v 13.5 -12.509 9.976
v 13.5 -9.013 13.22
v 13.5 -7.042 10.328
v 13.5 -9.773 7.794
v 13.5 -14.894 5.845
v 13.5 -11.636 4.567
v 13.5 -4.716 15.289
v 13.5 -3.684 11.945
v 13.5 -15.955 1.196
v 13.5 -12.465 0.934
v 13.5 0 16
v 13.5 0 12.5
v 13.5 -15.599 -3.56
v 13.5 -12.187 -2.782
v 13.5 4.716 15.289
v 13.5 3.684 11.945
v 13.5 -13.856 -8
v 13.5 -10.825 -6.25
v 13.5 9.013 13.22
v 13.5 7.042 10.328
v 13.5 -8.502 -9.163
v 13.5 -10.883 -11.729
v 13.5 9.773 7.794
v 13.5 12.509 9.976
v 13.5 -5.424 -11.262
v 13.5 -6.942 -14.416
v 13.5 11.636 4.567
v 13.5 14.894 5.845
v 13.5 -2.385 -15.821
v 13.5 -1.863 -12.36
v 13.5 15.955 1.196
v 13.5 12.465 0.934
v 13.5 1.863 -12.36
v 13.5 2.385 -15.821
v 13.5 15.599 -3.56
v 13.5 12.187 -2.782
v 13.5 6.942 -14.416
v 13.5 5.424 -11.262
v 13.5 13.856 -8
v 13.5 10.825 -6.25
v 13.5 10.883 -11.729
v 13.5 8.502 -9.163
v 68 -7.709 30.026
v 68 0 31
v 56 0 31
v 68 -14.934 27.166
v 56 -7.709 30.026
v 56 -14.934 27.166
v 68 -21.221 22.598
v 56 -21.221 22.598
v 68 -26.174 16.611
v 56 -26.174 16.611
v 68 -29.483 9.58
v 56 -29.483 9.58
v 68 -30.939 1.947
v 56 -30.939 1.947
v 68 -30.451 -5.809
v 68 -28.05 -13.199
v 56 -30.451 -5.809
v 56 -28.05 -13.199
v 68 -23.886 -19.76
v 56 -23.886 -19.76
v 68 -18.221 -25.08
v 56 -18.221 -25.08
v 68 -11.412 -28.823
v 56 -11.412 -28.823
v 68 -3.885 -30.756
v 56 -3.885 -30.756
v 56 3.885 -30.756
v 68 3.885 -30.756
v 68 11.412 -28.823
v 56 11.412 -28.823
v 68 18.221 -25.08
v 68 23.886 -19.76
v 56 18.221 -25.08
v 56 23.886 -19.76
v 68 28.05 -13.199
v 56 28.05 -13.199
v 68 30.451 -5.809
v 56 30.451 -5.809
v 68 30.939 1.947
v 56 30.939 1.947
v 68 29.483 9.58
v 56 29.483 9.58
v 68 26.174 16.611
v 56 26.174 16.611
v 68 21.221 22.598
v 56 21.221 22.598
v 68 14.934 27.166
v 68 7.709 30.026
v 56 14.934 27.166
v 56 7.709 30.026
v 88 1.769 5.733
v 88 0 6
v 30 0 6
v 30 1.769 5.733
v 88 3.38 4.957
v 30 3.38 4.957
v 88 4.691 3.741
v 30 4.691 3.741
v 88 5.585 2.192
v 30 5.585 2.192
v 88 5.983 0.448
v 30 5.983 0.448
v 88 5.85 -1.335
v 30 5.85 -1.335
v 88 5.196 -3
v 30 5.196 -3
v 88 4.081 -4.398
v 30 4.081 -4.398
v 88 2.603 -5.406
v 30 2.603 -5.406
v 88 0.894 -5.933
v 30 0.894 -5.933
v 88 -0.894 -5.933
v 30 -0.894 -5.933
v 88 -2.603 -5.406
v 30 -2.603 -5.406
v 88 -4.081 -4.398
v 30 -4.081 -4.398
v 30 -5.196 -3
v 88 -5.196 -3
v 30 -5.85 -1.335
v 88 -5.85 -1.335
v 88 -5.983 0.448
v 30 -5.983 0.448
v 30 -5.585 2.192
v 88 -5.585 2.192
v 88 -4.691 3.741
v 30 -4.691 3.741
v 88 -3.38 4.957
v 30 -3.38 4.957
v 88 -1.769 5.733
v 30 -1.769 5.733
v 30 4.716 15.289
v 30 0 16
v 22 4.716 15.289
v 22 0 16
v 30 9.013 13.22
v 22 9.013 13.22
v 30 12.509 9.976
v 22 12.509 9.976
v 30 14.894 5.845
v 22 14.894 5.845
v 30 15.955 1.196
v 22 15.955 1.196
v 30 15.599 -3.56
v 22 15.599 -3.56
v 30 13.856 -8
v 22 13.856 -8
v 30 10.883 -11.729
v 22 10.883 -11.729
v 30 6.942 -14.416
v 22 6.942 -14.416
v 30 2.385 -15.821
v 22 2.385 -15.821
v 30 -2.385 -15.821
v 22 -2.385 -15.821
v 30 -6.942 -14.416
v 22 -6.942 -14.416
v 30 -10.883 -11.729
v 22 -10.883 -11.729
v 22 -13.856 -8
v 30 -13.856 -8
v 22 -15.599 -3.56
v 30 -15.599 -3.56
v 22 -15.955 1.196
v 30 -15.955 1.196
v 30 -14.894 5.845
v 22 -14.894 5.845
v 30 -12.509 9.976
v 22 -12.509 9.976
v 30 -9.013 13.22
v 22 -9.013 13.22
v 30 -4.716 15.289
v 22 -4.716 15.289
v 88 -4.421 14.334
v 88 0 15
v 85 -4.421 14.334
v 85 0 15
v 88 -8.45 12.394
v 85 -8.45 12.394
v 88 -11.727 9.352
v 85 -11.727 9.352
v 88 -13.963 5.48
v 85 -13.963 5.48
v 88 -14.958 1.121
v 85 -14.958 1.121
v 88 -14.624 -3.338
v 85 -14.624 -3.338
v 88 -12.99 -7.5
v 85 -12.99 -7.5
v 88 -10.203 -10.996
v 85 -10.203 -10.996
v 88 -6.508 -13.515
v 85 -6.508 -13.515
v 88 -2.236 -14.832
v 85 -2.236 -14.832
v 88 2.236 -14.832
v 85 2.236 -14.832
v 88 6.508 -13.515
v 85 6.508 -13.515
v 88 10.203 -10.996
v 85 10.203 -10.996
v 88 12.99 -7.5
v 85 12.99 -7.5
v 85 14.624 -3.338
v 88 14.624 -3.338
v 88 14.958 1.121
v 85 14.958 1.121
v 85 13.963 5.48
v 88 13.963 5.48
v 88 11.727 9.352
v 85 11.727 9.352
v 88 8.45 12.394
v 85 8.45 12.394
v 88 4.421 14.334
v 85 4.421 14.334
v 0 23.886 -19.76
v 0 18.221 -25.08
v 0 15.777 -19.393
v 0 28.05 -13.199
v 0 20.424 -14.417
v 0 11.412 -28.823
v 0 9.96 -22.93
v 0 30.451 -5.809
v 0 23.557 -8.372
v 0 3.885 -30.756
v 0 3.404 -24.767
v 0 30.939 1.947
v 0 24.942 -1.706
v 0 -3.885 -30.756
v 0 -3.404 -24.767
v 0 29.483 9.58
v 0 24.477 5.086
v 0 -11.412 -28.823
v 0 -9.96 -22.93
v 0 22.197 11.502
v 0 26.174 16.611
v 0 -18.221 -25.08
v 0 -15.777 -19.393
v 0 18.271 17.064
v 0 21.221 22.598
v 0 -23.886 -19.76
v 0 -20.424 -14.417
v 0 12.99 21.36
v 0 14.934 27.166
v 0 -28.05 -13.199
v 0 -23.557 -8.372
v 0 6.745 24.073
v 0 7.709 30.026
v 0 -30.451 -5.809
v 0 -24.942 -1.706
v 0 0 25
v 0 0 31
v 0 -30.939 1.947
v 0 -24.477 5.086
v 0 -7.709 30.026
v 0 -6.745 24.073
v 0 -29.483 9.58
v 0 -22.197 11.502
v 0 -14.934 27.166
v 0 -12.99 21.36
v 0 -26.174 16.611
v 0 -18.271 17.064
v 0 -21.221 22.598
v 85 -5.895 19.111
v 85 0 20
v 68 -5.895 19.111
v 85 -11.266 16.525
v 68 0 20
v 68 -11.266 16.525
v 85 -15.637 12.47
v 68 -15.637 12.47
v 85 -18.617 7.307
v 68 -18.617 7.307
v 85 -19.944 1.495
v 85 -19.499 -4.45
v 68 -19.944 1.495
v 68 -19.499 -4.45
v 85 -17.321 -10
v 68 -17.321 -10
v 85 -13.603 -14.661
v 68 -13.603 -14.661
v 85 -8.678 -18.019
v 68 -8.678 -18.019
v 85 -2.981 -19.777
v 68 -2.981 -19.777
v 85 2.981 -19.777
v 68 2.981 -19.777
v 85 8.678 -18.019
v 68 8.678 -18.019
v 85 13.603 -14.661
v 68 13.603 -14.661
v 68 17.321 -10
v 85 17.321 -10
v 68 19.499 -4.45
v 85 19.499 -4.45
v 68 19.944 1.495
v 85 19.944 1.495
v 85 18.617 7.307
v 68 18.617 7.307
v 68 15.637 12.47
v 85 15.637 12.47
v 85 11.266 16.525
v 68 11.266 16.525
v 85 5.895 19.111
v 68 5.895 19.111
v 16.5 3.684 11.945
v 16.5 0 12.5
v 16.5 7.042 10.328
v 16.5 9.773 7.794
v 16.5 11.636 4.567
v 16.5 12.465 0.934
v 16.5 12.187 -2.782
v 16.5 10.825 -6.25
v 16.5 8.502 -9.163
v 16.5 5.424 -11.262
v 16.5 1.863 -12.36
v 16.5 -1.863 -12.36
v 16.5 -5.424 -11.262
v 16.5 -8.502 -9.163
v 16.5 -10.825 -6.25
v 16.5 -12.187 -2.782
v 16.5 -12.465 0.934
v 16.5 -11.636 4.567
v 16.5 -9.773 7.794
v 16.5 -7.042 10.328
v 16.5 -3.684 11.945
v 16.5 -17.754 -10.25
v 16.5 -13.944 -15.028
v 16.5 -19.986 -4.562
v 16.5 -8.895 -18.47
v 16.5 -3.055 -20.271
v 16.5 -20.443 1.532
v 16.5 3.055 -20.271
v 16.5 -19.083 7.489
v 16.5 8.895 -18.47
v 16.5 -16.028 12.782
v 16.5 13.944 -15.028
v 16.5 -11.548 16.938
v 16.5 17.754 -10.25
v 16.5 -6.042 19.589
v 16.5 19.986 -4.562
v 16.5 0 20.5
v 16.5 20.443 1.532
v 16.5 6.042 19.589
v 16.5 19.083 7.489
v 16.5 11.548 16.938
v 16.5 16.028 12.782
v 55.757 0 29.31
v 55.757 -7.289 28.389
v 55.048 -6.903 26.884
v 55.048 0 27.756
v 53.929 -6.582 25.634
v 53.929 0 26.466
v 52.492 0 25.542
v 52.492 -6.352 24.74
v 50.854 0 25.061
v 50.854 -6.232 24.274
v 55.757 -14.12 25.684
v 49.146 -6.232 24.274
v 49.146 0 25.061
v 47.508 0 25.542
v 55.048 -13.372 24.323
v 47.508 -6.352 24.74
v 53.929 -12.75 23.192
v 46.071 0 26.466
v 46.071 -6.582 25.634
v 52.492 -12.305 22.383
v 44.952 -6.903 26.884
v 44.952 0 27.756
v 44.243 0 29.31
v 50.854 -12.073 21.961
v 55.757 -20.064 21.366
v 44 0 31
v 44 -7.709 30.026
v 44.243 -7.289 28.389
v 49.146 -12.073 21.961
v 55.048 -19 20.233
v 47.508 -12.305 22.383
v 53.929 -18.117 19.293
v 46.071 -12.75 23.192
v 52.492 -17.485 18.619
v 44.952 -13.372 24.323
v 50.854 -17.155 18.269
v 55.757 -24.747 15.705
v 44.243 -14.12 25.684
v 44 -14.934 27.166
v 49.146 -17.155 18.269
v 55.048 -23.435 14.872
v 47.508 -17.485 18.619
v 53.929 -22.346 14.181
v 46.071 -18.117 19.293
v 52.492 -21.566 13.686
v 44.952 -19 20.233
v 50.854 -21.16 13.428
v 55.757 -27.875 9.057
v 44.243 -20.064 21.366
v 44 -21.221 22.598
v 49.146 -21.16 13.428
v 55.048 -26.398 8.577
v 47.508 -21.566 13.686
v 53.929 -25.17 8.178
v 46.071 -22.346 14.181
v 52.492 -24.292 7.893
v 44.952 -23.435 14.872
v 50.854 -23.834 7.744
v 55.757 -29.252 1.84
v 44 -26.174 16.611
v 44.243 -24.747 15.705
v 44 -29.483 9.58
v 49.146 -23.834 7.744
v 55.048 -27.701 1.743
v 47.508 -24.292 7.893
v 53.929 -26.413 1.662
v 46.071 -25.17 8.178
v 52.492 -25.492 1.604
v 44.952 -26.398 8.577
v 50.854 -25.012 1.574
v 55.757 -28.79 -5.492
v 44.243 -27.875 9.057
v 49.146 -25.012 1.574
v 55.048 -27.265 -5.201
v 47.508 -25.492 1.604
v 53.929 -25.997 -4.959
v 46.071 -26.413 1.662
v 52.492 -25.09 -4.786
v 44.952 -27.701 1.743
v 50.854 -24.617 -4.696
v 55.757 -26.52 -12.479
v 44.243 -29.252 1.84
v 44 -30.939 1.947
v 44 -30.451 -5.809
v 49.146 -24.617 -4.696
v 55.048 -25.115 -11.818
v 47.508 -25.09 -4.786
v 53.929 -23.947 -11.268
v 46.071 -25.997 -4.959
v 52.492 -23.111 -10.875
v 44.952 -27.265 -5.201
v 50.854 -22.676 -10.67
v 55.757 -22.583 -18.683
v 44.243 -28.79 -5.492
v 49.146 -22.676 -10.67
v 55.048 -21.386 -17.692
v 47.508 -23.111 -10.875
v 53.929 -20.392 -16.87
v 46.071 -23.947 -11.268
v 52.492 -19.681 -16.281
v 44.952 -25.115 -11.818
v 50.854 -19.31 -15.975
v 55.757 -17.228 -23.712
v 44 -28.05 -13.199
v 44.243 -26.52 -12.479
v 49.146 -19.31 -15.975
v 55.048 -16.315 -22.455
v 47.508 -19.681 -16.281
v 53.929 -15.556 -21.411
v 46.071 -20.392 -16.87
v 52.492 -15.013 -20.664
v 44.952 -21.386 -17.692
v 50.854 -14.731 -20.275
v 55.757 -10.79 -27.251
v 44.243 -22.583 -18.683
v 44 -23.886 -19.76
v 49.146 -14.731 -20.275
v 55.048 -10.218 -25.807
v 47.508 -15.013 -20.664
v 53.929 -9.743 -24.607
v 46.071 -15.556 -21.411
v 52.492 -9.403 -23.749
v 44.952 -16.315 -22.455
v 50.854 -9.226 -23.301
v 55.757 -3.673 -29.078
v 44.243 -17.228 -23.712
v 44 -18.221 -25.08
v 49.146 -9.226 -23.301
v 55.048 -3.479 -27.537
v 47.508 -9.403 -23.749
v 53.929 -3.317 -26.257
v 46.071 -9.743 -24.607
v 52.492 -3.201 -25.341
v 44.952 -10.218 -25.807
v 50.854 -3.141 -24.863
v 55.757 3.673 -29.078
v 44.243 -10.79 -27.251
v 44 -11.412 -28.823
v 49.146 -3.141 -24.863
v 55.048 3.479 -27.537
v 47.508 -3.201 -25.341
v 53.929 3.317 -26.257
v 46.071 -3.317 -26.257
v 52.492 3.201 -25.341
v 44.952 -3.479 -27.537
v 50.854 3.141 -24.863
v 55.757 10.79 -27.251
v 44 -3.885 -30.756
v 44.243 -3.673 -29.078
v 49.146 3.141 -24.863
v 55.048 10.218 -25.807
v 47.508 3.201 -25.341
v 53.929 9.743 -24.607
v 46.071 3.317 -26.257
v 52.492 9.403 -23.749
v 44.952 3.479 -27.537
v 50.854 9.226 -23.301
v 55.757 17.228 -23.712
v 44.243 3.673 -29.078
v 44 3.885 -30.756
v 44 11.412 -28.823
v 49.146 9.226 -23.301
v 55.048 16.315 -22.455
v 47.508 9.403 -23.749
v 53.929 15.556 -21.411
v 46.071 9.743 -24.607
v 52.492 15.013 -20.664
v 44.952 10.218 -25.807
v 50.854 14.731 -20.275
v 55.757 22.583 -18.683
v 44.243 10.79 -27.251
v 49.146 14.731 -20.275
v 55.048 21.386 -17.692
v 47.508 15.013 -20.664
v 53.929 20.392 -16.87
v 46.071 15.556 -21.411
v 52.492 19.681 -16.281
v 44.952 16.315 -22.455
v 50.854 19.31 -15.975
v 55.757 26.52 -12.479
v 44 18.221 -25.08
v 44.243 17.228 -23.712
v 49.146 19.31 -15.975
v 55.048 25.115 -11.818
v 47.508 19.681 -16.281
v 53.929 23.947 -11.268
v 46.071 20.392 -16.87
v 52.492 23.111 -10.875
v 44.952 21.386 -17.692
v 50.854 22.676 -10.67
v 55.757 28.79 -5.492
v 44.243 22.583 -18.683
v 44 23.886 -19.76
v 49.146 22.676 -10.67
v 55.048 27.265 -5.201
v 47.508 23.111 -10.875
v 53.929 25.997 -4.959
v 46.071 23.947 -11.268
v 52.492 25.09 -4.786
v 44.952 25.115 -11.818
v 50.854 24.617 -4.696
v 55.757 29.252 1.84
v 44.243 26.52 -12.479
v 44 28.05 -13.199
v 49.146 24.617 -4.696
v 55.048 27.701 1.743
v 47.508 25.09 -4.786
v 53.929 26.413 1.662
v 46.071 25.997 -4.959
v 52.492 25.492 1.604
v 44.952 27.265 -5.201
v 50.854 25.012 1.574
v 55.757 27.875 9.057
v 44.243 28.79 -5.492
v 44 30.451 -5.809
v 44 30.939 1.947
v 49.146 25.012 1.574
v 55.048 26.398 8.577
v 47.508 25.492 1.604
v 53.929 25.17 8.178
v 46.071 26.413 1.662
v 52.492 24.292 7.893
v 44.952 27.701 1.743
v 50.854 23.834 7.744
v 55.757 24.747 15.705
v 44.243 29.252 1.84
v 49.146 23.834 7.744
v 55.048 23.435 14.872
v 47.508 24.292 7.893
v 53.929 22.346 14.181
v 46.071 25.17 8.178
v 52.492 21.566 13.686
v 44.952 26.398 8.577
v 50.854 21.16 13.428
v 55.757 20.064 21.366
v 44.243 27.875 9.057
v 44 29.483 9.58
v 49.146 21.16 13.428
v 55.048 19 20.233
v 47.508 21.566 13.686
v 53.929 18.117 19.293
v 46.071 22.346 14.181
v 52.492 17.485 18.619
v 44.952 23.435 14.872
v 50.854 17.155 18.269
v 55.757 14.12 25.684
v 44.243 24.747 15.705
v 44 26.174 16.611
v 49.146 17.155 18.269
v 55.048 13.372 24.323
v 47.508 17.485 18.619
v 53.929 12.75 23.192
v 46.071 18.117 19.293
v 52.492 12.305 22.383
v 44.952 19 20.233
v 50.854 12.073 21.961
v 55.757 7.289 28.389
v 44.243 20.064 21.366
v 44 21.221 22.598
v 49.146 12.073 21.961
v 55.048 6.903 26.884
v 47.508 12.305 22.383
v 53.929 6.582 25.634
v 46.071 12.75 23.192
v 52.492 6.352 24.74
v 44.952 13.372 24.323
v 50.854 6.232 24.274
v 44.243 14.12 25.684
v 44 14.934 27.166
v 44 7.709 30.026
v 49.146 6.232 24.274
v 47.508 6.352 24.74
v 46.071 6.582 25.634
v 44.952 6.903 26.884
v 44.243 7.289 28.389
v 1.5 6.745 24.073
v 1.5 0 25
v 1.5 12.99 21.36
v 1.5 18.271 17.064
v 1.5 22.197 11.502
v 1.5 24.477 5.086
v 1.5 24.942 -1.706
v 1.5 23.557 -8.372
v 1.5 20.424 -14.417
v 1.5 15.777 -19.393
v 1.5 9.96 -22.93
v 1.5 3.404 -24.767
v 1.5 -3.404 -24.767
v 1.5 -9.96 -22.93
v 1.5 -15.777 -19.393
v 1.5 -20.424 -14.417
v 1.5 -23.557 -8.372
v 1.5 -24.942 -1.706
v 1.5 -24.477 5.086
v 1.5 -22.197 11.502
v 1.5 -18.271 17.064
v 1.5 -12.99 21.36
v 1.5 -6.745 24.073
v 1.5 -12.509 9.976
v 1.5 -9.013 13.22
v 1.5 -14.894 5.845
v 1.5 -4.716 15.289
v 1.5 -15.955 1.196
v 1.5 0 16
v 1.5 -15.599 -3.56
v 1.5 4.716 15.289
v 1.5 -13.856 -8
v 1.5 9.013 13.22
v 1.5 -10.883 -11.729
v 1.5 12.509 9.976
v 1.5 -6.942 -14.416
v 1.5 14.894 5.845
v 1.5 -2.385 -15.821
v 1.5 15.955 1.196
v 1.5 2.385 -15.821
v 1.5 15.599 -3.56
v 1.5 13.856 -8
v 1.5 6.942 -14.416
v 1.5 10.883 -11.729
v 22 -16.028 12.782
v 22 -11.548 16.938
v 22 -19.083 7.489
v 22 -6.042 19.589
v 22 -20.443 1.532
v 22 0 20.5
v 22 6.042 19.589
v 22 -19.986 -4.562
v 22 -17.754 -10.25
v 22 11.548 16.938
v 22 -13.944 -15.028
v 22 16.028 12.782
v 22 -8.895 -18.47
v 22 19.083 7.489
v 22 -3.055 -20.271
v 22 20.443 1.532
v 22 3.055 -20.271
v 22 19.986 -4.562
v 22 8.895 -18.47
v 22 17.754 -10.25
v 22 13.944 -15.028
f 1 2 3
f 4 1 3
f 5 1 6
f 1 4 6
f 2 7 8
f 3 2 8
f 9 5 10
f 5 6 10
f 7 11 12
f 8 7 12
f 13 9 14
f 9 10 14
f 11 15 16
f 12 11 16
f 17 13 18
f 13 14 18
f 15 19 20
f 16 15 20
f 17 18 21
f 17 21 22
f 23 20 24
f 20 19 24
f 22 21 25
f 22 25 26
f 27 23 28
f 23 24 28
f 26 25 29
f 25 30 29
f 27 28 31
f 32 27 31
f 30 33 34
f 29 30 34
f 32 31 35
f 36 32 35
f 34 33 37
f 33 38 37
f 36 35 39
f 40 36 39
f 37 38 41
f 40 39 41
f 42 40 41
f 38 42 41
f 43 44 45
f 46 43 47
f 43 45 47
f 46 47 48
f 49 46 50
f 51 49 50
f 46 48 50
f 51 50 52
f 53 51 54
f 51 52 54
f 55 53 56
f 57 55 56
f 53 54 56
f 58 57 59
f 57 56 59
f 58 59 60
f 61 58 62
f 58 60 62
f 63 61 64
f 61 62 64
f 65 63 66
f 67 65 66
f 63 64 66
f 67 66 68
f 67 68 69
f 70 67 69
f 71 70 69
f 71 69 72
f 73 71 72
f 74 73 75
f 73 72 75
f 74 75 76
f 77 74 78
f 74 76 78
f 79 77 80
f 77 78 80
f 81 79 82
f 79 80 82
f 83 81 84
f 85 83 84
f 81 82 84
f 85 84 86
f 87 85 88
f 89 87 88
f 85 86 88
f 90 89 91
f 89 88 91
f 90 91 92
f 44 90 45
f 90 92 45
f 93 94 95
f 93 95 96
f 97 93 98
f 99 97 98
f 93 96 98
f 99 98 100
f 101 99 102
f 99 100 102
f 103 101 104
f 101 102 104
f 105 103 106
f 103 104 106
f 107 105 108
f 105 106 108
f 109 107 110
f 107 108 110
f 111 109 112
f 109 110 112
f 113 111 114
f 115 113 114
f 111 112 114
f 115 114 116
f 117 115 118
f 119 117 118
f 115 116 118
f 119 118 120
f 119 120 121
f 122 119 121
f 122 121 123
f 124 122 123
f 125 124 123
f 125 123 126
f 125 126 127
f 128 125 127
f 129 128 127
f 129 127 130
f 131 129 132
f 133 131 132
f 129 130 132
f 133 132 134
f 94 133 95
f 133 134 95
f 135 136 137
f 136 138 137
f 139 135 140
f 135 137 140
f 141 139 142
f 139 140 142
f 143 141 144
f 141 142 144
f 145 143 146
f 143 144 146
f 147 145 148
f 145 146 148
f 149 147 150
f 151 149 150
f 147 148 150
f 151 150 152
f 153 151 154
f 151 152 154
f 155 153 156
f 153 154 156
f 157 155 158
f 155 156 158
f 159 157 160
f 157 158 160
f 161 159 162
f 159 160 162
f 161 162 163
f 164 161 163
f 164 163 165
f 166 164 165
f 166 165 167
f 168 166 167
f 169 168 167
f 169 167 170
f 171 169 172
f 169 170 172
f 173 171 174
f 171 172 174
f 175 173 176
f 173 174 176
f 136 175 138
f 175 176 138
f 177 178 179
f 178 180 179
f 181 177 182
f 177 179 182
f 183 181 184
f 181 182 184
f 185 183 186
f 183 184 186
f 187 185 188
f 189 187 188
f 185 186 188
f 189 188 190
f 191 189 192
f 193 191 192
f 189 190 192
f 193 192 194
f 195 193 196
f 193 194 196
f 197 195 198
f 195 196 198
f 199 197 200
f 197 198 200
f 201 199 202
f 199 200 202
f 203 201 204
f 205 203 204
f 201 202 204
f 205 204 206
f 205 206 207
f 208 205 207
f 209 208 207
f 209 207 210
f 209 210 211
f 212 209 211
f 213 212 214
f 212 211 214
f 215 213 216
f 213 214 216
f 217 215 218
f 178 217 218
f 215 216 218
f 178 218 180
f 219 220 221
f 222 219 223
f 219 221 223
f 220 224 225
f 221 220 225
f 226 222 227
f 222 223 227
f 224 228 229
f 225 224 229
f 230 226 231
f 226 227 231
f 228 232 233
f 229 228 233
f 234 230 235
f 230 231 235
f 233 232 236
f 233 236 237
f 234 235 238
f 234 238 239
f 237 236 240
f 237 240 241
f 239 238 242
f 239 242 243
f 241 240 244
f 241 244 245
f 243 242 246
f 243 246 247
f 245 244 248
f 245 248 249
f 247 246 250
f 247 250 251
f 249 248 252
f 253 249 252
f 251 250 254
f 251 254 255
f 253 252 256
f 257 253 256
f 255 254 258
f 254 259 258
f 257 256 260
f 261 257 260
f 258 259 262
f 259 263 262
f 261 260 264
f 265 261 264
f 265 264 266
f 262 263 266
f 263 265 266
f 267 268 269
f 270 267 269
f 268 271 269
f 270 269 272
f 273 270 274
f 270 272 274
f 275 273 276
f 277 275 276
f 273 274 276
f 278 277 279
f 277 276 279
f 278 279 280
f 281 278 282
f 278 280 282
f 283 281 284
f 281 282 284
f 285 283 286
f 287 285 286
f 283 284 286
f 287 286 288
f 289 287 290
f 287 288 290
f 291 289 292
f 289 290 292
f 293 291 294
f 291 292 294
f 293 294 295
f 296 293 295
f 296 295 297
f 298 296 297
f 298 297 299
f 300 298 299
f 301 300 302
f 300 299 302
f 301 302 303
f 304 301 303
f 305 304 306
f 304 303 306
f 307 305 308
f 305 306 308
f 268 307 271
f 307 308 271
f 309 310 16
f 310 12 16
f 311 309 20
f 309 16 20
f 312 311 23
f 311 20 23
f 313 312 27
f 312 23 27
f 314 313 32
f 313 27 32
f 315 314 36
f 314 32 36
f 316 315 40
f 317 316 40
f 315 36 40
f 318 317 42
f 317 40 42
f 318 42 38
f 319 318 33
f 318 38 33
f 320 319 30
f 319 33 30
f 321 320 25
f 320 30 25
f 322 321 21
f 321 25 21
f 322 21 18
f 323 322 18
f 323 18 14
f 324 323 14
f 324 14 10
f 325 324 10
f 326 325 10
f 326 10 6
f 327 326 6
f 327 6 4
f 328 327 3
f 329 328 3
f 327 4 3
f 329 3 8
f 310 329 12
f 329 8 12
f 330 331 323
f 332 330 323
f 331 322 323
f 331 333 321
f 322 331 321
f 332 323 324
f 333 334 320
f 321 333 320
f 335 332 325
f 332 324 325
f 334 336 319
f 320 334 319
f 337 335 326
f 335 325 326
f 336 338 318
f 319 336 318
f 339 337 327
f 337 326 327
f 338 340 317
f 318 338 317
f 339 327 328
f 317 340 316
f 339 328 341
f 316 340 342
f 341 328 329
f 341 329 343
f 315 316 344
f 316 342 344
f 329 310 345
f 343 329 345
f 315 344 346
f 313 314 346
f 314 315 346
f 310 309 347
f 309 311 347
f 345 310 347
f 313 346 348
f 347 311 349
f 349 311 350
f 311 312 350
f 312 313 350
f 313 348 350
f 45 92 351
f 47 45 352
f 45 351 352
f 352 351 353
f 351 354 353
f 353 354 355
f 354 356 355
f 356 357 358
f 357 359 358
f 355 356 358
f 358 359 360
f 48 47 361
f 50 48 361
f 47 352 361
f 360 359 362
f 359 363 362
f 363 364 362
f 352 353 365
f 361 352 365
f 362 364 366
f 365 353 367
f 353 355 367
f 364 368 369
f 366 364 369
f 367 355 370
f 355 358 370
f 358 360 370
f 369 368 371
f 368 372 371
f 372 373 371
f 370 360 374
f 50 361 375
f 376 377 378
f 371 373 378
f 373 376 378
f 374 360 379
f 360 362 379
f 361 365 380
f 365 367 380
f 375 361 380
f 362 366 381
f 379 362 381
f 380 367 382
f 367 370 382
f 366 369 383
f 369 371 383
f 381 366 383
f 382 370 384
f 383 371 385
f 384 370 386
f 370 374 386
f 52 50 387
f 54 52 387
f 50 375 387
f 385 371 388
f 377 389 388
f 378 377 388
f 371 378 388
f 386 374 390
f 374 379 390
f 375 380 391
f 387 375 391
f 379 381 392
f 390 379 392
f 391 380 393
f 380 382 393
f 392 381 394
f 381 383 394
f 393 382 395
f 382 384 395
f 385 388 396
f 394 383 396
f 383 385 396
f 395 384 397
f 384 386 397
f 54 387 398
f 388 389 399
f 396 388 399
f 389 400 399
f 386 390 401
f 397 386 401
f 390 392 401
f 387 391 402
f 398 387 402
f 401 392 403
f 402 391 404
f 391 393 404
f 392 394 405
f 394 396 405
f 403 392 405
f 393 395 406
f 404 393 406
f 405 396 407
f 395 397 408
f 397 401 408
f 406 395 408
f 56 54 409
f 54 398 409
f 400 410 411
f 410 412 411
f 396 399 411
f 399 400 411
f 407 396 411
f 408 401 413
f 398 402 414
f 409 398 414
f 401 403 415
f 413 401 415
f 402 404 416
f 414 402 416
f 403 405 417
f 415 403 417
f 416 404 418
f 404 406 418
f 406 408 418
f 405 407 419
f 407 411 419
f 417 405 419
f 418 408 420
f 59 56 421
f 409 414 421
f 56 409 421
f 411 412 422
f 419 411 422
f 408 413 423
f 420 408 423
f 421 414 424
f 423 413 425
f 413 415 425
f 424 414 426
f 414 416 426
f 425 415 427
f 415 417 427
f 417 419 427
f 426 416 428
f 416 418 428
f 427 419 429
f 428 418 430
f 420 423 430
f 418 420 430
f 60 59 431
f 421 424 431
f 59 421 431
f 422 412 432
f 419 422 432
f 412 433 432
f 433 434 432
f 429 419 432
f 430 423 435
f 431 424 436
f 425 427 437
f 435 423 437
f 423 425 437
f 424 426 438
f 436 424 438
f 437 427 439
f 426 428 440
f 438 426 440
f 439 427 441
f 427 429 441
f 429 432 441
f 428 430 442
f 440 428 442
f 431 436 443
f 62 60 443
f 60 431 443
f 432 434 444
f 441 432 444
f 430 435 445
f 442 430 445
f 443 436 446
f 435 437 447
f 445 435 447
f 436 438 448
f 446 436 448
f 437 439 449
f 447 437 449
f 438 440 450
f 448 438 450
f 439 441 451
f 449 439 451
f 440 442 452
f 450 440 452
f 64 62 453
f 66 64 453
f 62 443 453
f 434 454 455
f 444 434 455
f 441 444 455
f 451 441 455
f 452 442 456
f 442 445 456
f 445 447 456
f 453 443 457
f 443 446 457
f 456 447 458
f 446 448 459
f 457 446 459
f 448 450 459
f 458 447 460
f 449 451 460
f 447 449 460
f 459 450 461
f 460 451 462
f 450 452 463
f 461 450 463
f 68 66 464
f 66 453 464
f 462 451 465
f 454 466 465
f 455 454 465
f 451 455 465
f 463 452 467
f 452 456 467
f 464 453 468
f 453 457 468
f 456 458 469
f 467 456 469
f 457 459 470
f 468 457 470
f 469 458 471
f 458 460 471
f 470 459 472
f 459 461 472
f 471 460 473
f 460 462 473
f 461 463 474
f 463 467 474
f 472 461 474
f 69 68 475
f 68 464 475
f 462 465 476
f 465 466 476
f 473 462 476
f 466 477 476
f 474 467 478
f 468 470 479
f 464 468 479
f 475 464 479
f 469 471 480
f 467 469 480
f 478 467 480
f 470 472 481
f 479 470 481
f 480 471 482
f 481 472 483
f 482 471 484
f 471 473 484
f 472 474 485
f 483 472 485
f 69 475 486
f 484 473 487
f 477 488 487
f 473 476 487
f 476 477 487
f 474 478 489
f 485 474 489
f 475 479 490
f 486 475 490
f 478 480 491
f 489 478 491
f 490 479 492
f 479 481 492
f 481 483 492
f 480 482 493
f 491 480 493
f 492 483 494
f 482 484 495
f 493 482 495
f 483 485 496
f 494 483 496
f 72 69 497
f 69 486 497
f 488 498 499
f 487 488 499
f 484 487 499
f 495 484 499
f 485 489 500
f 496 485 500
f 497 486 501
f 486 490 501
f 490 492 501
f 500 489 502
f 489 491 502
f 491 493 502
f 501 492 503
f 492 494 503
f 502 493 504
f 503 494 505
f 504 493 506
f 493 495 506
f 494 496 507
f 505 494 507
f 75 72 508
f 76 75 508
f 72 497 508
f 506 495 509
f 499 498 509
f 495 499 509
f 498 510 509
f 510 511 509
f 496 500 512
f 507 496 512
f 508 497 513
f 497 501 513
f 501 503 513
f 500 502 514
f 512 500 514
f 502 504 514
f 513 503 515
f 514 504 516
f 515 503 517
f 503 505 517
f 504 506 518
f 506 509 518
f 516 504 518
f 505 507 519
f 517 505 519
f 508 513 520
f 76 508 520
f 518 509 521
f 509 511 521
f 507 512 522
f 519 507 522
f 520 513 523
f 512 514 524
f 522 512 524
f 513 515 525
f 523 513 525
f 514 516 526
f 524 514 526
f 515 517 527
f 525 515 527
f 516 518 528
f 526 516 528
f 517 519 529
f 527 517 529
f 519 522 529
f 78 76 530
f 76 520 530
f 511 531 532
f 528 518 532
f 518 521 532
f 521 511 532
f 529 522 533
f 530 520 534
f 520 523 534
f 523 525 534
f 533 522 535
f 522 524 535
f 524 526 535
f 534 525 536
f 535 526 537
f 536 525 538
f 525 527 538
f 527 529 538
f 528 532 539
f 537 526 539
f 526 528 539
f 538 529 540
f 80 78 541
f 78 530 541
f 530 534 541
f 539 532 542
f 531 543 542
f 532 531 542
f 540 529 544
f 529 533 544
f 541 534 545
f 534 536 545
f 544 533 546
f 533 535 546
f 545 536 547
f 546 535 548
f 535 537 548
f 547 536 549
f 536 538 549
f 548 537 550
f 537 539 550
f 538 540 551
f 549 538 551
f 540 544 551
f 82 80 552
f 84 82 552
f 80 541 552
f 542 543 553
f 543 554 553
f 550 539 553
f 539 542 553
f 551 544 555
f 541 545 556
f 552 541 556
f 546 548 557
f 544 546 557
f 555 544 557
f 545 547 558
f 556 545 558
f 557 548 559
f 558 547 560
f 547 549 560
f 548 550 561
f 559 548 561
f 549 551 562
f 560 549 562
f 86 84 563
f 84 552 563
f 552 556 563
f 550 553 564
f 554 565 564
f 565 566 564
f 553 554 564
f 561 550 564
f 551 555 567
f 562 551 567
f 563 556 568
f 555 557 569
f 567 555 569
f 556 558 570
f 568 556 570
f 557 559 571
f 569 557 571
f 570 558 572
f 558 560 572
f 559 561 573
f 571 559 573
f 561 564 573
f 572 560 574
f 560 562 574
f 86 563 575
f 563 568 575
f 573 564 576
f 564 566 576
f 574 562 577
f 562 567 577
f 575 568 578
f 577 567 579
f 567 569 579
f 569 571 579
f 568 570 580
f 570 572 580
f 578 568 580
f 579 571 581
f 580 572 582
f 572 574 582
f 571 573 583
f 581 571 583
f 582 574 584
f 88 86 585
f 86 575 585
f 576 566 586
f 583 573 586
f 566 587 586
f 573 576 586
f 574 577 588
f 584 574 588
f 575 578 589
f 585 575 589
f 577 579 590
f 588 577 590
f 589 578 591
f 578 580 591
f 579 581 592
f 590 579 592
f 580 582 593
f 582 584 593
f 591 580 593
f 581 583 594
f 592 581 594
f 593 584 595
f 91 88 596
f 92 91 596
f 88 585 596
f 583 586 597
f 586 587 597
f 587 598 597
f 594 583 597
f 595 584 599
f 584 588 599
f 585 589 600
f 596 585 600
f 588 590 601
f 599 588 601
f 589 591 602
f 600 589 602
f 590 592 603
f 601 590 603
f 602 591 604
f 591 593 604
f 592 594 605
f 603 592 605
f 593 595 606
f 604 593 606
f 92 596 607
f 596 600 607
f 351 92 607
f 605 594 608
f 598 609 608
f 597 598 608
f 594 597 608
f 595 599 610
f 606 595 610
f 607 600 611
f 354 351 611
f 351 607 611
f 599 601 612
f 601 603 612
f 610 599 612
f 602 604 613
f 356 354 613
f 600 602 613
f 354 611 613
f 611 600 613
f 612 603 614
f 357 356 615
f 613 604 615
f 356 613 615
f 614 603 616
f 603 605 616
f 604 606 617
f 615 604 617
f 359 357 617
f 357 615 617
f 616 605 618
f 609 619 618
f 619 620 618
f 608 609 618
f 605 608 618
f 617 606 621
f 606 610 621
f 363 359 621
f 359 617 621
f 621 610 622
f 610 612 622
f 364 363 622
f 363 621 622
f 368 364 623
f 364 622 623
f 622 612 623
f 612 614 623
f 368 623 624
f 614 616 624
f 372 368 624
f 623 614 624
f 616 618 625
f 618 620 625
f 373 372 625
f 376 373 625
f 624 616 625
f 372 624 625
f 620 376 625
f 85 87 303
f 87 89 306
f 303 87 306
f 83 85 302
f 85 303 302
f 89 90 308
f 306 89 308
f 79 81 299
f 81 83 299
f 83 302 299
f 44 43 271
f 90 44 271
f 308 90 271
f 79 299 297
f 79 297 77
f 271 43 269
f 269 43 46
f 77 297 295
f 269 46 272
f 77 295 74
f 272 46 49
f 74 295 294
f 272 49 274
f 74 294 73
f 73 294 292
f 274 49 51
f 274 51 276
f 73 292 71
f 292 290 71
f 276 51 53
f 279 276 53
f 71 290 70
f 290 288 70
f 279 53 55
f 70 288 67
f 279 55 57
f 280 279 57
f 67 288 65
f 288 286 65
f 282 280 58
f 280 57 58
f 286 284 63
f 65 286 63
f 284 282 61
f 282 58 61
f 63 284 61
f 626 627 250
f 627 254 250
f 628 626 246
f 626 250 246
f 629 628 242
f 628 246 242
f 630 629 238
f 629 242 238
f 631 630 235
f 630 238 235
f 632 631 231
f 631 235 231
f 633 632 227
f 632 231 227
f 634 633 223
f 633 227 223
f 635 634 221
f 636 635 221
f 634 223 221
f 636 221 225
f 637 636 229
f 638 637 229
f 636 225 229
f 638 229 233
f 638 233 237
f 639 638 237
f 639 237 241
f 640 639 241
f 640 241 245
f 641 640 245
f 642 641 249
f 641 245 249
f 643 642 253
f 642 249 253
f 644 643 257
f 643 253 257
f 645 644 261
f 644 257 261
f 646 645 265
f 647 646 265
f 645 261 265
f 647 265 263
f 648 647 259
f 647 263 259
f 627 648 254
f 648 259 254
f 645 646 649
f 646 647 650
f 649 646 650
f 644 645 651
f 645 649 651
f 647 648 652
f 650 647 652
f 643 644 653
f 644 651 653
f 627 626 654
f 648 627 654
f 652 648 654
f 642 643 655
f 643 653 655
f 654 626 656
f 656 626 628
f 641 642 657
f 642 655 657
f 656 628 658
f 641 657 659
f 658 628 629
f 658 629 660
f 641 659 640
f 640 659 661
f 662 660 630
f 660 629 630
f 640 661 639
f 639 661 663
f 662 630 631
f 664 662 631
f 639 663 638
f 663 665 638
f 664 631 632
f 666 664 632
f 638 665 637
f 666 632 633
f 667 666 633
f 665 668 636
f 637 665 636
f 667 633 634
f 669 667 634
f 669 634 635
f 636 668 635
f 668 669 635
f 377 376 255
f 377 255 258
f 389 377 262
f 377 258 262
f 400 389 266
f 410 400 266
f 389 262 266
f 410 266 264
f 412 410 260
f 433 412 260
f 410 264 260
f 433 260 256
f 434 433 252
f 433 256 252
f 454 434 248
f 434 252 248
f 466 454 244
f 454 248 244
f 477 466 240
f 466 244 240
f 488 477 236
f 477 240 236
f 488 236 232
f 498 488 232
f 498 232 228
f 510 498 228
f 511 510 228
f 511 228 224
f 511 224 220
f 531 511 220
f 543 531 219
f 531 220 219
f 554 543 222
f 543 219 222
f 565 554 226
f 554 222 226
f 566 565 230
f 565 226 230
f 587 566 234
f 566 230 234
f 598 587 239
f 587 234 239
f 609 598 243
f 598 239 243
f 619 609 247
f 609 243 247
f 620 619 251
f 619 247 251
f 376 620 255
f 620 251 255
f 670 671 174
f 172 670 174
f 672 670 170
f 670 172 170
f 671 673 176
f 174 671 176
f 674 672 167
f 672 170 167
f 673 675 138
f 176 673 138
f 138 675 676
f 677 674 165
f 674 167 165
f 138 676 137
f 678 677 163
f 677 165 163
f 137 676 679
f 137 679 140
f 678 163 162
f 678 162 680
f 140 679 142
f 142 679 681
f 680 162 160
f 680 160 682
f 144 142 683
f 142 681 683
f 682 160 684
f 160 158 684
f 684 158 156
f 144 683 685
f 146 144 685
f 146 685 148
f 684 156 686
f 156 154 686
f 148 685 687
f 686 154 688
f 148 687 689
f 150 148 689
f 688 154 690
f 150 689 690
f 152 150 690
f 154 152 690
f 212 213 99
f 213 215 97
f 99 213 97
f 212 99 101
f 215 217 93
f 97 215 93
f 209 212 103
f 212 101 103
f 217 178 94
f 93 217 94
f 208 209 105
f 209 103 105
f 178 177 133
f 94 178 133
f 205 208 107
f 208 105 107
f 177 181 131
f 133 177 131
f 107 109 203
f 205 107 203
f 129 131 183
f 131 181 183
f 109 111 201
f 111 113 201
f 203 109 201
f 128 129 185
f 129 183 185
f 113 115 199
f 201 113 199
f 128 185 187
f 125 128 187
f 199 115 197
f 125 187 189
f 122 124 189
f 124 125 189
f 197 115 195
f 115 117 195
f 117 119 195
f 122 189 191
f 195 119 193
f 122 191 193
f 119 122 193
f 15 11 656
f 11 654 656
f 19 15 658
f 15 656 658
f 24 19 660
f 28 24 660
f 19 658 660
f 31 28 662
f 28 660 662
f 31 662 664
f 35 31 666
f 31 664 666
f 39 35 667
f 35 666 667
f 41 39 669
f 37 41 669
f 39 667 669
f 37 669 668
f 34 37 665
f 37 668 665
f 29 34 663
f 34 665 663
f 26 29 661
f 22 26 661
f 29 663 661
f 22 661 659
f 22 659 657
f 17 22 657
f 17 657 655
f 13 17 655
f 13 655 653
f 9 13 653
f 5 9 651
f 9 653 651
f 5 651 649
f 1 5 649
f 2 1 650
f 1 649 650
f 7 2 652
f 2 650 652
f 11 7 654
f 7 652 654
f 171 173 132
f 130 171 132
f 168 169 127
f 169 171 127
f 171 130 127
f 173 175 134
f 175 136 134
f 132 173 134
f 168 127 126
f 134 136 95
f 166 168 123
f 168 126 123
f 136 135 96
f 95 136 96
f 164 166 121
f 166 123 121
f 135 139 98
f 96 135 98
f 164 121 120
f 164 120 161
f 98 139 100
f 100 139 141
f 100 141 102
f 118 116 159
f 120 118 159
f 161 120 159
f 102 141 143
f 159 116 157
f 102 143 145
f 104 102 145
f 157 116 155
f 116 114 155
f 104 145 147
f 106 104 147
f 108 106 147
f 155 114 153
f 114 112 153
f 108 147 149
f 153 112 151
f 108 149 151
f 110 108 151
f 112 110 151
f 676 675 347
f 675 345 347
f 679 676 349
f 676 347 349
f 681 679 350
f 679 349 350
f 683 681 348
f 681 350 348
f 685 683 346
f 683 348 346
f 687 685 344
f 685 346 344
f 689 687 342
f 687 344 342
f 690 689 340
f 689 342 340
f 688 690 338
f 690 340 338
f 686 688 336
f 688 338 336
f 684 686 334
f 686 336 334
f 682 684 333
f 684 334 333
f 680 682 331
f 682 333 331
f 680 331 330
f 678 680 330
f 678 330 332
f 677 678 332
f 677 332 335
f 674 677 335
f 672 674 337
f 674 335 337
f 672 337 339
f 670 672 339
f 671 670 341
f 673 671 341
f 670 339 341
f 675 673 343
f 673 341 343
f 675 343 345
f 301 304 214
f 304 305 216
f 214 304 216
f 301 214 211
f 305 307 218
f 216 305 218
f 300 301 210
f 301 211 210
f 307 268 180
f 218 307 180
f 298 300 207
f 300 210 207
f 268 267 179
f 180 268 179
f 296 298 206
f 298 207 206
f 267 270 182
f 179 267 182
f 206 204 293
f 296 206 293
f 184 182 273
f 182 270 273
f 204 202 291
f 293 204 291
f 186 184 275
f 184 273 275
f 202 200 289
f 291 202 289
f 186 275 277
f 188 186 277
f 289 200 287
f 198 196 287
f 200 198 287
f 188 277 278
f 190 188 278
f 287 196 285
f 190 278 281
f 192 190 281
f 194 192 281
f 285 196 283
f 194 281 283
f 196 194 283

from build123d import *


with BuildPart() as f1:
    # F0 (on Front) → F1 (revolve)
    with BuildSketch(Plane.XZ):
        with BuildLine():
            Line((0, 31), (0, 0))
            Line((0, 0), (88, 0))
            Line((88, 0), (88, 15))
            Line((88, 15), (85, 15))
            Line((85, 15), (85, 20))
            Line((85, 20), (68, 20))
            Line((68, 20), (68, 31))
            Line((68, 31), (56, 31))
            ThreePointArc((56, 31), (50, 25), (44, 31))
            Line((44, 31), (0, 31))
        make_face()
    revolve(axis=Axis((54.523584, 0, 0), (1, 0, 0)))

    # F2 (on Front) → F3 (revolve, cut)
    with BuildSketch(Plane.XZ):
        Polygon((0, 25), (0, 0), (135.937035, 0), (135.937035, 6), (30, 6), (30, 16), (22, 16), (22, 20.5), (16.5, 20.5), (16.5, 12.5), (13.5, 12.5), (13.5, 16), (1.5, 16), (1.5, 25), align=None)
    revolve(axis=Axis((-19.679806, 0, 0), (-1, 0, 0)), mode=Mode.SUBTRACT)


solid = f1.part
